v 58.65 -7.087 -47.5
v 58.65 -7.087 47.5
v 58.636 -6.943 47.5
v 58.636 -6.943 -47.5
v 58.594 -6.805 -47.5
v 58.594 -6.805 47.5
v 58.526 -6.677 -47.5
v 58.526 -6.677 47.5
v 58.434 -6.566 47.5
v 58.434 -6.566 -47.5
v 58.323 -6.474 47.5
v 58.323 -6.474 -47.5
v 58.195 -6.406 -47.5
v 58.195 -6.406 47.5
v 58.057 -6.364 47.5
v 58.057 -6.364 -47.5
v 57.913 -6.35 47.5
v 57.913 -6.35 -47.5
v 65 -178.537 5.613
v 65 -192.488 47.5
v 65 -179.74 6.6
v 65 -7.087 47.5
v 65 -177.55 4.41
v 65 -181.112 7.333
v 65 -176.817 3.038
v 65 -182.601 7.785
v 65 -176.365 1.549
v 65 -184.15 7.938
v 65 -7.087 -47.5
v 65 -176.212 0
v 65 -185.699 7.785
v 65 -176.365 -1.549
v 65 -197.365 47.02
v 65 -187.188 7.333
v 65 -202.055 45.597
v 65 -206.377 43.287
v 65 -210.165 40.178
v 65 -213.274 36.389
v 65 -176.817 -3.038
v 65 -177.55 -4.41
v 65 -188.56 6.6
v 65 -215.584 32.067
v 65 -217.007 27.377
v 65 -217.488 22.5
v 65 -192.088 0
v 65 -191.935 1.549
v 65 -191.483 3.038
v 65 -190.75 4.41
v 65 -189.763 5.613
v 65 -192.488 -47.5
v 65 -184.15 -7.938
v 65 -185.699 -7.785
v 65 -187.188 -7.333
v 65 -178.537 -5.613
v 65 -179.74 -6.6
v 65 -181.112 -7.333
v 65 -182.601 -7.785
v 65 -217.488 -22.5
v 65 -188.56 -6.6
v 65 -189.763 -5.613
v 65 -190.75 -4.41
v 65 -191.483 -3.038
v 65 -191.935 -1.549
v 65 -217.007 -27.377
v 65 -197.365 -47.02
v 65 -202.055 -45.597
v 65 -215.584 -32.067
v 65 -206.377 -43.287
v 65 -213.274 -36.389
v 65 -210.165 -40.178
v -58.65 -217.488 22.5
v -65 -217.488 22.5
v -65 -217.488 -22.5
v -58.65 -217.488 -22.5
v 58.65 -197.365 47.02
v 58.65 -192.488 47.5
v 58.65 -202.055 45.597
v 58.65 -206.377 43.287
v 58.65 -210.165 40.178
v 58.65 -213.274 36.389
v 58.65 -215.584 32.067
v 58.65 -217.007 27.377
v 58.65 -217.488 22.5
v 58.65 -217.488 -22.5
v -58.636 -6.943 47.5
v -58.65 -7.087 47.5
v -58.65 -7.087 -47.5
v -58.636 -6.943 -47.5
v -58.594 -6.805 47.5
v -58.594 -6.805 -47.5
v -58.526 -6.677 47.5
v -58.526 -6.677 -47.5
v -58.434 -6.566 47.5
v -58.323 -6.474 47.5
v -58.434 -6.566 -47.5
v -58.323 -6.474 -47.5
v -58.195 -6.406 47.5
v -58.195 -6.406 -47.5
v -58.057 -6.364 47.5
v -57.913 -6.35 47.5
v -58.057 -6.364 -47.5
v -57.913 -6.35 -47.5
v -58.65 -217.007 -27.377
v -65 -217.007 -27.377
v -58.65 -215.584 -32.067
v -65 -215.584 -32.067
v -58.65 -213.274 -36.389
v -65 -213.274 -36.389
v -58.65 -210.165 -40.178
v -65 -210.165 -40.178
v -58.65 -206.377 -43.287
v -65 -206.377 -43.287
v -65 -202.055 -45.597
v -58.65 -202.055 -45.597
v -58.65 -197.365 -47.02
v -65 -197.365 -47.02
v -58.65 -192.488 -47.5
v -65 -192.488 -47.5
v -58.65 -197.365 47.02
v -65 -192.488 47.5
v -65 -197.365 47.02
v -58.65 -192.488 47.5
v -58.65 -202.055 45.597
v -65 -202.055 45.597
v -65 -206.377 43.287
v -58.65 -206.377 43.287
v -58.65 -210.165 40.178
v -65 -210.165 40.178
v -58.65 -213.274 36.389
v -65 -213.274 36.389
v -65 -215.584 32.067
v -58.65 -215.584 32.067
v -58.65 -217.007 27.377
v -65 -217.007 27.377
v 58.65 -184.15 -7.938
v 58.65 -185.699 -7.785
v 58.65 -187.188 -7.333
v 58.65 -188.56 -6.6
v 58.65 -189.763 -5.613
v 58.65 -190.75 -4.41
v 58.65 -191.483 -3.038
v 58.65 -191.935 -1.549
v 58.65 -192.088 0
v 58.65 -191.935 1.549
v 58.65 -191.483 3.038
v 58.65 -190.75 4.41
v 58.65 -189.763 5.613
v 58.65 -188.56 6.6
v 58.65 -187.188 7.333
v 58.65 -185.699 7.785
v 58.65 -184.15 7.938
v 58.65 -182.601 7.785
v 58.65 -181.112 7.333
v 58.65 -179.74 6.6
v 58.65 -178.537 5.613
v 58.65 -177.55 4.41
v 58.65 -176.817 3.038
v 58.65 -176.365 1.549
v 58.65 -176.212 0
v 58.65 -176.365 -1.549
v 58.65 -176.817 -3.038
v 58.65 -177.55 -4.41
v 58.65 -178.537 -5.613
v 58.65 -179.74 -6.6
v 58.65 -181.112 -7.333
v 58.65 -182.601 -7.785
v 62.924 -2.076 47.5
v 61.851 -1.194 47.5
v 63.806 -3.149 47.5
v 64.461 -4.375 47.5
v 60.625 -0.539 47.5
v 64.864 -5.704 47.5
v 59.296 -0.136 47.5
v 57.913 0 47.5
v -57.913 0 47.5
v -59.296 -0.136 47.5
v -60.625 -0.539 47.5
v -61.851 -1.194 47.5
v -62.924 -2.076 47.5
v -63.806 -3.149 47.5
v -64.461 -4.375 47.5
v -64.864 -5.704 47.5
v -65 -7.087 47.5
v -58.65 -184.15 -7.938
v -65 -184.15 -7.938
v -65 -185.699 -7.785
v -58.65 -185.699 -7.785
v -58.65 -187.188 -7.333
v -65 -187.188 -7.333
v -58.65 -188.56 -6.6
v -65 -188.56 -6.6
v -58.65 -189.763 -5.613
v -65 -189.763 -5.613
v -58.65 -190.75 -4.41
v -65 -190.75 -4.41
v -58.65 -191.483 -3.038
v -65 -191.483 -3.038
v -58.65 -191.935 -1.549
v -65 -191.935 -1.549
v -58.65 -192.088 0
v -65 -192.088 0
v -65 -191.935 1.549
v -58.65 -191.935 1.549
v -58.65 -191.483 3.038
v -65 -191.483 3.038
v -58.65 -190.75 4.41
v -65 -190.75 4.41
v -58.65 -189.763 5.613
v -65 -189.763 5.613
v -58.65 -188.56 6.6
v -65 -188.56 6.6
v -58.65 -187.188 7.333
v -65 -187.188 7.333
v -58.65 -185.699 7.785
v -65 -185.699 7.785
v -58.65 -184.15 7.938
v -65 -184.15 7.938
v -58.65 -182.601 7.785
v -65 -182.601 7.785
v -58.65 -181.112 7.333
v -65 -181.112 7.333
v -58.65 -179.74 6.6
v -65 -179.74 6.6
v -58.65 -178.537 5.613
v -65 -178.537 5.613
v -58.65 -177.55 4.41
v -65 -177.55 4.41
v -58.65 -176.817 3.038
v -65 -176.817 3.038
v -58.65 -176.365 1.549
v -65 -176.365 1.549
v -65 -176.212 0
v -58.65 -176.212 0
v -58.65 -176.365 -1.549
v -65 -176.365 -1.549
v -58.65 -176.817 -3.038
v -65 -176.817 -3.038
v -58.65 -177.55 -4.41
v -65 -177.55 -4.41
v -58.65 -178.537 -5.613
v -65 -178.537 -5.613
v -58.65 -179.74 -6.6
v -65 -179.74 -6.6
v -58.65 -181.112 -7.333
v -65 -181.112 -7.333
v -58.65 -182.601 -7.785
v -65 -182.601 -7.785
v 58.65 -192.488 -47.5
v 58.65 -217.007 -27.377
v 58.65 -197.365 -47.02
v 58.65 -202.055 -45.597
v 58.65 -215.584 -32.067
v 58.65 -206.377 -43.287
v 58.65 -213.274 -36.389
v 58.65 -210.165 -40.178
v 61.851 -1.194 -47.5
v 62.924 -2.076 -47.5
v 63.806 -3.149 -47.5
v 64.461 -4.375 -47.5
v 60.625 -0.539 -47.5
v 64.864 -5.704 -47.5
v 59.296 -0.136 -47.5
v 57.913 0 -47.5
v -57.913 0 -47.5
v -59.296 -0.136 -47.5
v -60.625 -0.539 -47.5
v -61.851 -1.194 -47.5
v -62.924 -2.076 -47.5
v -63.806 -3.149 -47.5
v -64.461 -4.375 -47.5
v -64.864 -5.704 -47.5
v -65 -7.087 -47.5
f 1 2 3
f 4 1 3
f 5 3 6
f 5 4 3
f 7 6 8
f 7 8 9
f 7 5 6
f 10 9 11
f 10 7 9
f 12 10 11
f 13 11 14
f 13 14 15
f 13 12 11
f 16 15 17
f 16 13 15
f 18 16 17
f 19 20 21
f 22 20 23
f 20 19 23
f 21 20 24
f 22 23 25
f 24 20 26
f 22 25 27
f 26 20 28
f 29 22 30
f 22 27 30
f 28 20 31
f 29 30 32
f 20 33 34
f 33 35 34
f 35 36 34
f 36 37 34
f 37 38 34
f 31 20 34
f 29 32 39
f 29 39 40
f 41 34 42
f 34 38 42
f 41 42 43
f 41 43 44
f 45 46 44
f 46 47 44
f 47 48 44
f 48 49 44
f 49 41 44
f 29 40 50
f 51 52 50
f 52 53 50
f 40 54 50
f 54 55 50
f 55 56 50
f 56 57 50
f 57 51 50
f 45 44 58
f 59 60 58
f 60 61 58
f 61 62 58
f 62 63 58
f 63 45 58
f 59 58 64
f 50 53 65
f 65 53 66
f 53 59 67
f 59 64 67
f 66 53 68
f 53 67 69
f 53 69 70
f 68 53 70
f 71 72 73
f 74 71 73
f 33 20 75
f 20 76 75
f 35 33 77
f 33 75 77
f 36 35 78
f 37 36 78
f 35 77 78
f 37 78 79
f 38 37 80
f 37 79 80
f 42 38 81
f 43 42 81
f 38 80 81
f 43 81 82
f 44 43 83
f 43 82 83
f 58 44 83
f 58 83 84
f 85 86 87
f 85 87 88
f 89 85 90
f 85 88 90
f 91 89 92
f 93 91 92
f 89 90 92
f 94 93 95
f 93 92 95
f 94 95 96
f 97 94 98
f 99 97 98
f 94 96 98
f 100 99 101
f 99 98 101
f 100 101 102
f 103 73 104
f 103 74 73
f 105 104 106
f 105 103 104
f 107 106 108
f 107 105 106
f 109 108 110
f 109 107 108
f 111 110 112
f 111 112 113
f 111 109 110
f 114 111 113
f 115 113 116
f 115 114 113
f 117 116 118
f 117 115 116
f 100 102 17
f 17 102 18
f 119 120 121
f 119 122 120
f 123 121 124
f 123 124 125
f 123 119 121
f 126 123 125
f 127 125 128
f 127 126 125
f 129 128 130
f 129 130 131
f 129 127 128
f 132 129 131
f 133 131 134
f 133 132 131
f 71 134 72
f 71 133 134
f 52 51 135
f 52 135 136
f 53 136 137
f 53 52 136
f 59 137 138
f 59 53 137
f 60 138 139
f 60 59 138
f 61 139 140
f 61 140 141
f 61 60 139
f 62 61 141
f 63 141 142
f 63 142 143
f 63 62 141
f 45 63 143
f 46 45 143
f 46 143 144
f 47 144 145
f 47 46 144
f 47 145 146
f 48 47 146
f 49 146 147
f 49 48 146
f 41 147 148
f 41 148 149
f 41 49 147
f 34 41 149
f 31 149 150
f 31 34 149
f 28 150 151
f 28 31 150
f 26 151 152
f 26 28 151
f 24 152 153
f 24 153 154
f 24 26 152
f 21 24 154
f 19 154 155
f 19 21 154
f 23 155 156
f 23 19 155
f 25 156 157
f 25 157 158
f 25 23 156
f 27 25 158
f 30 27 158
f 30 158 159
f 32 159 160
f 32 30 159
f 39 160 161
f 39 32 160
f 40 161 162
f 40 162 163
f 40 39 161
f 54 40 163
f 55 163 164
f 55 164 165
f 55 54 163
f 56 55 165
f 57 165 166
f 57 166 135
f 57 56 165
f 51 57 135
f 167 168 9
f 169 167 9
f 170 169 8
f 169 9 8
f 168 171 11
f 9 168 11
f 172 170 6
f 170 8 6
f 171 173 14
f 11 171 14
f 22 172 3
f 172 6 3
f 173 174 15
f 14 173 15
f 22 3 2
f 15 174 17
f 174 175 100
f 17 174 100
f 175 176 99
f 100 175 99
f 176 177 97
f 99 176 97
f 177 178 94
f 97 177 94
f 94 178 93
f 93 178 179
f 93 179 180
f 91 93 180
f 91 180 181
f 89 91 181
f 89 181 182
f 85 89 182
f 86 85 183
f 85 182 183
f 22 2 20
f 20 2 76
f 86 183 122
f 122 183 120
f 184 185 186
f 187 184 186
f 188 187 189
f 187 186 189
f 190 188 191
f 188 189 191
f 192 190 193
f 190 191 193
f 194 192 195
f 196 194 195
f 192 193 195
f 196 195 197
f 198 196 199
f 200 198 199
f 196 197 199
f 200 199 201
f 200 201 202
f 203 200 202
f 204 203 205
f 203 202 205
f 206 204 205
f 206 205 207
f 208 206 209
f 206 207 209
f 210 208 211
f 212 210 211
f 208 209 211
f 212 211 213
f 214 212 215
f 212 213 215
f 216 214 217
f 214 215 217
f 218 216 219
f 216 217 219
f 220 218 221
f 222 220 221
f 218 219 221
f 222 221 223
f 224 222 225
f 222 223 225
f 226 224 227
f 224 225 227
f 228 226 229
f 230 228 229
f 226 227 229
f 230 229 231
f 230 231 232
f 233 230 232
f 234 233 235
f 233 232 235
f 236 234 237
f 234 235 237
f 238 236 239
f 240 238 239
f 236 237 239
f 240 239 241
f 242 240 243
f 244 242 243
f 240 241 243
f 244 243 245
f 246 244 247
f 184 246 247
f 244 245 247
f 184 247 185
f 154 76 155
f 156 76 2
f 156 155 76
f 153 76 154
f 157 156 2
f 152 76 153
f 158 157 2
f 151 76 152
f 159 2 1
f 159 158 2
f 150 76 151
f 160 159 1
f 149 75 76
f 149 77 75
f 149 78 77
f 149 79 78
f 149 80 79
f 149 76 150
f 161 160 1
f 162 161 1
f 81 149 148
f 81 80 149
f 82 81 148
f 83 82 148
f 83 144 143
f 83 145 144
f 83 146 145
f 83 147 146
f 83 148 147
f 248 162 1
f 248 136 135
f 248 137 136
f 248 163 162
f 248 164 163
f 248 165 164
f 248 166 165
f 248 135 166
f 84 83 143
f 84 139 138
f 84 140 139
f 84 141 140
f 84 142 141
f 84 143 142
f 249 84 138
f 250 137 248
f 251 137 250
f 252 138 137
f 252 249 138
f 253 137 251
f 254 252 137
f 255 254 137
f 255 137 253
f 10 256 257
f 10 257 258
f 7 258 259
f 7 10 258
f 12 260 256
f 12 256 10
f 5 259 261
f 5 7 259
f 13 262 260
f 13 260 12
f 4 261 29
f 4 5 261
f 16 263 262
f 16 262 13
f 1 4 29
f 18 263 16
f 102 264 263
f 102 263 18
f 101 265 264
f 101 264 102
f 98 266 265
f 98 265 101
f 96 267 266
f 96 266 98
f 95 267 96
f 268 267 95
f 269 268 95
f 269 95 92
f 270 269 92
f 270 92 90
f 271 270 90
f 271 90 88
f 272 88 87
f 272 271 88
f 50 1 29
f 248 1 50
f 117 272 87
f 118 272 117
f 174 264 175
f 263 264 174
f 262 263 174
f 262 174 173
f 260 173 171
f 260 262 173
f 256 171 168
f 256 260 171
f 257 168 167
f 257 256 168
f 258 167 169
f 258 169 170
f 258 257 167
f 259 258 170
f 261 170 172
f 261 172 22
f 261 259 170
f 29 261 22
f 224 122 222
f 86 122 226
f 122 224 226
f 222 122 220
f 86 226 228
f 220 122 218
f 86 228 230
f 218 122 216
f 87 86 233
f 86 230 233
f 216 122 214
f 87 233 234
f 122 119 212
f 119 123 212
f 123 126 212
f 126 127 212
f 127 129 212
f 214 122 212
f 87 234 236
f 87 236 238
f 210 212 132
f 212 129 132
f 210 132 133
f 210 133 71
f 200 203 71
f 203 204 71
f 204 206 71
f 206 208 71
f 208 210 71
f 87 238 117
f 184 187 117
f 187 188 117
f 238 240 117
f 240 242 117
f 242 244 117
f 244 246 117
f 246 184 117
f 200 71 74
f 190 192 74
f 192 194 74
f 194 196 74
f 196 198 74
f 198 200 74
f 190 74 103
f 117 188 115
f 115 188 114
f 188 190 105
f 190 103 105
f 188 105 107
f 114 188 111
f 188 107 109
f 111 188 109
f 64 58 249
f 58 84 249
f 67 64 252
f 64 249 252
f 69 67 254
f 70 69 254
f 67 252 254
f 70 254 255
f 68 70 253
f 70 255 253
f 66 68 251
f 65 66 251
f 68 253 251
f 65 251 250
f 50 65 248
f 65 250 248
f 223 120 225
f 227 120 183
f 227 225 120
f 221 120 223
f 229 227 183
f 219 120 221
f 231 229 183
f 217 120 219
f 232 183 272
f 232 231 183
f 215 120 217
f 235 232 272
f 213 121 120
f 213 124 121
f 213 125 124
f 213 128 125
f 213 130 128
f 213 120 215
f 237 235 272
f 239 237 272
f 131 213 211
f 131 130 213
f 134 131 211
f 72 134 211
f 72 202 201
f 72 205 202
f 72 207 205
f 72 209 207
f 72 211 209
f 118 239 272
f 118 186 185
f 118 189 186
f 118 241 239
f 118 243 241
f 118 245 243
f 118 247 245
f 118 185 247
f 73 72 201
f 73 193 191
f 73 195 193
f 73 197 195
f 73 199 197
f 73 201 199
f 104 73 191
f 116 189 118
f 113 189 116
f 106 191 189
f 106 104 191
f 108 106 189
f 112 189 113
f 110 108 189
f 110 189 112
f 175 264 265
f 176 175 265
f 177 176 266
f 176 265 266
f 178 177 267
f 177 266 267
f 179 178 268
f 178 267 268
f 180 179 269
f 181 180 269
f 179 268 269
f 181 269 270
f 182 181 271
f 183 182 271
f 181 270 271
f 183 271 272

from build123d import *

# Parameters (mm, degrees)
SKETCH3_W                    = 130
SKETCH3_H                    = 95
BASE_FLANGE1_DEPTH           = 6.35
EDGE_FLANGE1_STRIP_W         = 26.8732
EDGE_FLANGE1_STRIP_H         = 6.35
EDGE_FLANGE1_STRIP_CUT_DEPTH = 95
EDGE_FLANGE1_DEPTH           = 95
EDGE_FLANGE1_PROFILE_W       = 95
EDGE_FLANGE1_PROFILE_H       = 210.4009
EDGE_FLANGE1_PROFILE_R       = 7.9375
EDGE_FLANGE1_FLAT_DEPTH      = 6.35
FILLET1_R                    = 25


# Sheet-metal steps are written as plain solids
with BuildPart() as part:
    # Sketch3 → Base-Flange1 (new body)
    with BuildSketch(Plane(origin=(0, 0, 0), x_dir=(1, 0, 0), z_dir=(0, 1, 0))):
        Rectangle(SKETCH3_W, SKETCH3_H)
    extrude(amount=-BASE_FLANGE1_DEPTH)

    # Edge-Flange1 strip (across the edge) → Edge-Flange1 strip cut (cut)
    with BuildSketch(Plane(origin=(65, -6.35, -47.5), x_dir=(-1, 0, 0), z_dir=(0, 0, 1))):
        with Locations((-6.35, -3.175)):
            Rectangle(EDGE_FLANGE1_STRIP_W, EDGE_FLANGE1_STRIP_H)
    edge_flange1_strip_cut = extrude(amount=EDGE_FLANGE1_STRIP_CUT_DEPTH, mode=Mode.SUBTRACT)

    # Edge-Flange1 bend section (across the edge) → Edge-Flange1 (add)
    with BuildSketch(Plane(origin=(65, -6.35, -47.5), x_dir=(-1, 0, 0), z_dir=(0, 0, 1))):
        with BuildLine():
            Line((0, 0.7366), (6.35, 0.7366))
            ThreePointArc((6.35, 0.7366), (6.565745145, 0.215745145), (7.0866, 0))
            Line((7.0866, 0), (7.0866, -6.35))
            ThreePointArc((7.0866, -6.35), (2.075617084, -4.274382916), (0, 0.7366))
        make_face()
    edge_flange1 = extrude(amount=EDGE_FLANGE1_DEPTH)

    # Edge-Flange1 profile (on flange) → Edge-Flange1 flat (add)
    with BuildSketch(Plane(origin=(65, -6.35, 0), x_dir=(0, 0, -1), z_dir=(-1, 0, 0))):
        with Locations((0, 105.93705)):
            Rectangle(EDGE_FLANGE1_PROFILE_W, EDGE_FLANGE1_PROFILE_H)
        with Locations((0, 177.8)):
            Circle(EDGE_FLANGE1_PROFILE_R, mode=Mode.SUBTRACT)
    edge_flange1_flat = extrude(amount=EDGE_FLANGE1_FLAT_DEPTH)

    # Mirror1: Edge-Flange1 strip cut, Edge-Flange1, Edge-Flange1 flat across plane
    add(edge_flange1_strip_cut.mirror(Plane(origin=(0, 0, 0), x_dir=(0, 0, 1), z_dir=(1, 0, 0))), mode=Mode.SUBTRACT)
    add(edge_flange1.mirror(Plane(origin=(0, 0, 0), x_dir=(0, 0, 1), z_dir=(1, 0, 0))))
    add(edge_flange1_flat.mirror(Plane(origin=(0, 0, 0), x_dir=(0, 0, 1), z_dir=(1, 0, 0))))

    # Fillet1
    fillet1_edges = [part.edges().sort_by_distance(p)[0] for p in [
        (61.825, -217.4875, -47.5),
        (61.825, -217.4875, 47.5),
        (-61.825, -217.4875, 47.5),
        (-61.825, -217.4875, -47.5),
    ]]
    fillet(fillet1_edges, radius=FILLET1_R)


solid = part.part
